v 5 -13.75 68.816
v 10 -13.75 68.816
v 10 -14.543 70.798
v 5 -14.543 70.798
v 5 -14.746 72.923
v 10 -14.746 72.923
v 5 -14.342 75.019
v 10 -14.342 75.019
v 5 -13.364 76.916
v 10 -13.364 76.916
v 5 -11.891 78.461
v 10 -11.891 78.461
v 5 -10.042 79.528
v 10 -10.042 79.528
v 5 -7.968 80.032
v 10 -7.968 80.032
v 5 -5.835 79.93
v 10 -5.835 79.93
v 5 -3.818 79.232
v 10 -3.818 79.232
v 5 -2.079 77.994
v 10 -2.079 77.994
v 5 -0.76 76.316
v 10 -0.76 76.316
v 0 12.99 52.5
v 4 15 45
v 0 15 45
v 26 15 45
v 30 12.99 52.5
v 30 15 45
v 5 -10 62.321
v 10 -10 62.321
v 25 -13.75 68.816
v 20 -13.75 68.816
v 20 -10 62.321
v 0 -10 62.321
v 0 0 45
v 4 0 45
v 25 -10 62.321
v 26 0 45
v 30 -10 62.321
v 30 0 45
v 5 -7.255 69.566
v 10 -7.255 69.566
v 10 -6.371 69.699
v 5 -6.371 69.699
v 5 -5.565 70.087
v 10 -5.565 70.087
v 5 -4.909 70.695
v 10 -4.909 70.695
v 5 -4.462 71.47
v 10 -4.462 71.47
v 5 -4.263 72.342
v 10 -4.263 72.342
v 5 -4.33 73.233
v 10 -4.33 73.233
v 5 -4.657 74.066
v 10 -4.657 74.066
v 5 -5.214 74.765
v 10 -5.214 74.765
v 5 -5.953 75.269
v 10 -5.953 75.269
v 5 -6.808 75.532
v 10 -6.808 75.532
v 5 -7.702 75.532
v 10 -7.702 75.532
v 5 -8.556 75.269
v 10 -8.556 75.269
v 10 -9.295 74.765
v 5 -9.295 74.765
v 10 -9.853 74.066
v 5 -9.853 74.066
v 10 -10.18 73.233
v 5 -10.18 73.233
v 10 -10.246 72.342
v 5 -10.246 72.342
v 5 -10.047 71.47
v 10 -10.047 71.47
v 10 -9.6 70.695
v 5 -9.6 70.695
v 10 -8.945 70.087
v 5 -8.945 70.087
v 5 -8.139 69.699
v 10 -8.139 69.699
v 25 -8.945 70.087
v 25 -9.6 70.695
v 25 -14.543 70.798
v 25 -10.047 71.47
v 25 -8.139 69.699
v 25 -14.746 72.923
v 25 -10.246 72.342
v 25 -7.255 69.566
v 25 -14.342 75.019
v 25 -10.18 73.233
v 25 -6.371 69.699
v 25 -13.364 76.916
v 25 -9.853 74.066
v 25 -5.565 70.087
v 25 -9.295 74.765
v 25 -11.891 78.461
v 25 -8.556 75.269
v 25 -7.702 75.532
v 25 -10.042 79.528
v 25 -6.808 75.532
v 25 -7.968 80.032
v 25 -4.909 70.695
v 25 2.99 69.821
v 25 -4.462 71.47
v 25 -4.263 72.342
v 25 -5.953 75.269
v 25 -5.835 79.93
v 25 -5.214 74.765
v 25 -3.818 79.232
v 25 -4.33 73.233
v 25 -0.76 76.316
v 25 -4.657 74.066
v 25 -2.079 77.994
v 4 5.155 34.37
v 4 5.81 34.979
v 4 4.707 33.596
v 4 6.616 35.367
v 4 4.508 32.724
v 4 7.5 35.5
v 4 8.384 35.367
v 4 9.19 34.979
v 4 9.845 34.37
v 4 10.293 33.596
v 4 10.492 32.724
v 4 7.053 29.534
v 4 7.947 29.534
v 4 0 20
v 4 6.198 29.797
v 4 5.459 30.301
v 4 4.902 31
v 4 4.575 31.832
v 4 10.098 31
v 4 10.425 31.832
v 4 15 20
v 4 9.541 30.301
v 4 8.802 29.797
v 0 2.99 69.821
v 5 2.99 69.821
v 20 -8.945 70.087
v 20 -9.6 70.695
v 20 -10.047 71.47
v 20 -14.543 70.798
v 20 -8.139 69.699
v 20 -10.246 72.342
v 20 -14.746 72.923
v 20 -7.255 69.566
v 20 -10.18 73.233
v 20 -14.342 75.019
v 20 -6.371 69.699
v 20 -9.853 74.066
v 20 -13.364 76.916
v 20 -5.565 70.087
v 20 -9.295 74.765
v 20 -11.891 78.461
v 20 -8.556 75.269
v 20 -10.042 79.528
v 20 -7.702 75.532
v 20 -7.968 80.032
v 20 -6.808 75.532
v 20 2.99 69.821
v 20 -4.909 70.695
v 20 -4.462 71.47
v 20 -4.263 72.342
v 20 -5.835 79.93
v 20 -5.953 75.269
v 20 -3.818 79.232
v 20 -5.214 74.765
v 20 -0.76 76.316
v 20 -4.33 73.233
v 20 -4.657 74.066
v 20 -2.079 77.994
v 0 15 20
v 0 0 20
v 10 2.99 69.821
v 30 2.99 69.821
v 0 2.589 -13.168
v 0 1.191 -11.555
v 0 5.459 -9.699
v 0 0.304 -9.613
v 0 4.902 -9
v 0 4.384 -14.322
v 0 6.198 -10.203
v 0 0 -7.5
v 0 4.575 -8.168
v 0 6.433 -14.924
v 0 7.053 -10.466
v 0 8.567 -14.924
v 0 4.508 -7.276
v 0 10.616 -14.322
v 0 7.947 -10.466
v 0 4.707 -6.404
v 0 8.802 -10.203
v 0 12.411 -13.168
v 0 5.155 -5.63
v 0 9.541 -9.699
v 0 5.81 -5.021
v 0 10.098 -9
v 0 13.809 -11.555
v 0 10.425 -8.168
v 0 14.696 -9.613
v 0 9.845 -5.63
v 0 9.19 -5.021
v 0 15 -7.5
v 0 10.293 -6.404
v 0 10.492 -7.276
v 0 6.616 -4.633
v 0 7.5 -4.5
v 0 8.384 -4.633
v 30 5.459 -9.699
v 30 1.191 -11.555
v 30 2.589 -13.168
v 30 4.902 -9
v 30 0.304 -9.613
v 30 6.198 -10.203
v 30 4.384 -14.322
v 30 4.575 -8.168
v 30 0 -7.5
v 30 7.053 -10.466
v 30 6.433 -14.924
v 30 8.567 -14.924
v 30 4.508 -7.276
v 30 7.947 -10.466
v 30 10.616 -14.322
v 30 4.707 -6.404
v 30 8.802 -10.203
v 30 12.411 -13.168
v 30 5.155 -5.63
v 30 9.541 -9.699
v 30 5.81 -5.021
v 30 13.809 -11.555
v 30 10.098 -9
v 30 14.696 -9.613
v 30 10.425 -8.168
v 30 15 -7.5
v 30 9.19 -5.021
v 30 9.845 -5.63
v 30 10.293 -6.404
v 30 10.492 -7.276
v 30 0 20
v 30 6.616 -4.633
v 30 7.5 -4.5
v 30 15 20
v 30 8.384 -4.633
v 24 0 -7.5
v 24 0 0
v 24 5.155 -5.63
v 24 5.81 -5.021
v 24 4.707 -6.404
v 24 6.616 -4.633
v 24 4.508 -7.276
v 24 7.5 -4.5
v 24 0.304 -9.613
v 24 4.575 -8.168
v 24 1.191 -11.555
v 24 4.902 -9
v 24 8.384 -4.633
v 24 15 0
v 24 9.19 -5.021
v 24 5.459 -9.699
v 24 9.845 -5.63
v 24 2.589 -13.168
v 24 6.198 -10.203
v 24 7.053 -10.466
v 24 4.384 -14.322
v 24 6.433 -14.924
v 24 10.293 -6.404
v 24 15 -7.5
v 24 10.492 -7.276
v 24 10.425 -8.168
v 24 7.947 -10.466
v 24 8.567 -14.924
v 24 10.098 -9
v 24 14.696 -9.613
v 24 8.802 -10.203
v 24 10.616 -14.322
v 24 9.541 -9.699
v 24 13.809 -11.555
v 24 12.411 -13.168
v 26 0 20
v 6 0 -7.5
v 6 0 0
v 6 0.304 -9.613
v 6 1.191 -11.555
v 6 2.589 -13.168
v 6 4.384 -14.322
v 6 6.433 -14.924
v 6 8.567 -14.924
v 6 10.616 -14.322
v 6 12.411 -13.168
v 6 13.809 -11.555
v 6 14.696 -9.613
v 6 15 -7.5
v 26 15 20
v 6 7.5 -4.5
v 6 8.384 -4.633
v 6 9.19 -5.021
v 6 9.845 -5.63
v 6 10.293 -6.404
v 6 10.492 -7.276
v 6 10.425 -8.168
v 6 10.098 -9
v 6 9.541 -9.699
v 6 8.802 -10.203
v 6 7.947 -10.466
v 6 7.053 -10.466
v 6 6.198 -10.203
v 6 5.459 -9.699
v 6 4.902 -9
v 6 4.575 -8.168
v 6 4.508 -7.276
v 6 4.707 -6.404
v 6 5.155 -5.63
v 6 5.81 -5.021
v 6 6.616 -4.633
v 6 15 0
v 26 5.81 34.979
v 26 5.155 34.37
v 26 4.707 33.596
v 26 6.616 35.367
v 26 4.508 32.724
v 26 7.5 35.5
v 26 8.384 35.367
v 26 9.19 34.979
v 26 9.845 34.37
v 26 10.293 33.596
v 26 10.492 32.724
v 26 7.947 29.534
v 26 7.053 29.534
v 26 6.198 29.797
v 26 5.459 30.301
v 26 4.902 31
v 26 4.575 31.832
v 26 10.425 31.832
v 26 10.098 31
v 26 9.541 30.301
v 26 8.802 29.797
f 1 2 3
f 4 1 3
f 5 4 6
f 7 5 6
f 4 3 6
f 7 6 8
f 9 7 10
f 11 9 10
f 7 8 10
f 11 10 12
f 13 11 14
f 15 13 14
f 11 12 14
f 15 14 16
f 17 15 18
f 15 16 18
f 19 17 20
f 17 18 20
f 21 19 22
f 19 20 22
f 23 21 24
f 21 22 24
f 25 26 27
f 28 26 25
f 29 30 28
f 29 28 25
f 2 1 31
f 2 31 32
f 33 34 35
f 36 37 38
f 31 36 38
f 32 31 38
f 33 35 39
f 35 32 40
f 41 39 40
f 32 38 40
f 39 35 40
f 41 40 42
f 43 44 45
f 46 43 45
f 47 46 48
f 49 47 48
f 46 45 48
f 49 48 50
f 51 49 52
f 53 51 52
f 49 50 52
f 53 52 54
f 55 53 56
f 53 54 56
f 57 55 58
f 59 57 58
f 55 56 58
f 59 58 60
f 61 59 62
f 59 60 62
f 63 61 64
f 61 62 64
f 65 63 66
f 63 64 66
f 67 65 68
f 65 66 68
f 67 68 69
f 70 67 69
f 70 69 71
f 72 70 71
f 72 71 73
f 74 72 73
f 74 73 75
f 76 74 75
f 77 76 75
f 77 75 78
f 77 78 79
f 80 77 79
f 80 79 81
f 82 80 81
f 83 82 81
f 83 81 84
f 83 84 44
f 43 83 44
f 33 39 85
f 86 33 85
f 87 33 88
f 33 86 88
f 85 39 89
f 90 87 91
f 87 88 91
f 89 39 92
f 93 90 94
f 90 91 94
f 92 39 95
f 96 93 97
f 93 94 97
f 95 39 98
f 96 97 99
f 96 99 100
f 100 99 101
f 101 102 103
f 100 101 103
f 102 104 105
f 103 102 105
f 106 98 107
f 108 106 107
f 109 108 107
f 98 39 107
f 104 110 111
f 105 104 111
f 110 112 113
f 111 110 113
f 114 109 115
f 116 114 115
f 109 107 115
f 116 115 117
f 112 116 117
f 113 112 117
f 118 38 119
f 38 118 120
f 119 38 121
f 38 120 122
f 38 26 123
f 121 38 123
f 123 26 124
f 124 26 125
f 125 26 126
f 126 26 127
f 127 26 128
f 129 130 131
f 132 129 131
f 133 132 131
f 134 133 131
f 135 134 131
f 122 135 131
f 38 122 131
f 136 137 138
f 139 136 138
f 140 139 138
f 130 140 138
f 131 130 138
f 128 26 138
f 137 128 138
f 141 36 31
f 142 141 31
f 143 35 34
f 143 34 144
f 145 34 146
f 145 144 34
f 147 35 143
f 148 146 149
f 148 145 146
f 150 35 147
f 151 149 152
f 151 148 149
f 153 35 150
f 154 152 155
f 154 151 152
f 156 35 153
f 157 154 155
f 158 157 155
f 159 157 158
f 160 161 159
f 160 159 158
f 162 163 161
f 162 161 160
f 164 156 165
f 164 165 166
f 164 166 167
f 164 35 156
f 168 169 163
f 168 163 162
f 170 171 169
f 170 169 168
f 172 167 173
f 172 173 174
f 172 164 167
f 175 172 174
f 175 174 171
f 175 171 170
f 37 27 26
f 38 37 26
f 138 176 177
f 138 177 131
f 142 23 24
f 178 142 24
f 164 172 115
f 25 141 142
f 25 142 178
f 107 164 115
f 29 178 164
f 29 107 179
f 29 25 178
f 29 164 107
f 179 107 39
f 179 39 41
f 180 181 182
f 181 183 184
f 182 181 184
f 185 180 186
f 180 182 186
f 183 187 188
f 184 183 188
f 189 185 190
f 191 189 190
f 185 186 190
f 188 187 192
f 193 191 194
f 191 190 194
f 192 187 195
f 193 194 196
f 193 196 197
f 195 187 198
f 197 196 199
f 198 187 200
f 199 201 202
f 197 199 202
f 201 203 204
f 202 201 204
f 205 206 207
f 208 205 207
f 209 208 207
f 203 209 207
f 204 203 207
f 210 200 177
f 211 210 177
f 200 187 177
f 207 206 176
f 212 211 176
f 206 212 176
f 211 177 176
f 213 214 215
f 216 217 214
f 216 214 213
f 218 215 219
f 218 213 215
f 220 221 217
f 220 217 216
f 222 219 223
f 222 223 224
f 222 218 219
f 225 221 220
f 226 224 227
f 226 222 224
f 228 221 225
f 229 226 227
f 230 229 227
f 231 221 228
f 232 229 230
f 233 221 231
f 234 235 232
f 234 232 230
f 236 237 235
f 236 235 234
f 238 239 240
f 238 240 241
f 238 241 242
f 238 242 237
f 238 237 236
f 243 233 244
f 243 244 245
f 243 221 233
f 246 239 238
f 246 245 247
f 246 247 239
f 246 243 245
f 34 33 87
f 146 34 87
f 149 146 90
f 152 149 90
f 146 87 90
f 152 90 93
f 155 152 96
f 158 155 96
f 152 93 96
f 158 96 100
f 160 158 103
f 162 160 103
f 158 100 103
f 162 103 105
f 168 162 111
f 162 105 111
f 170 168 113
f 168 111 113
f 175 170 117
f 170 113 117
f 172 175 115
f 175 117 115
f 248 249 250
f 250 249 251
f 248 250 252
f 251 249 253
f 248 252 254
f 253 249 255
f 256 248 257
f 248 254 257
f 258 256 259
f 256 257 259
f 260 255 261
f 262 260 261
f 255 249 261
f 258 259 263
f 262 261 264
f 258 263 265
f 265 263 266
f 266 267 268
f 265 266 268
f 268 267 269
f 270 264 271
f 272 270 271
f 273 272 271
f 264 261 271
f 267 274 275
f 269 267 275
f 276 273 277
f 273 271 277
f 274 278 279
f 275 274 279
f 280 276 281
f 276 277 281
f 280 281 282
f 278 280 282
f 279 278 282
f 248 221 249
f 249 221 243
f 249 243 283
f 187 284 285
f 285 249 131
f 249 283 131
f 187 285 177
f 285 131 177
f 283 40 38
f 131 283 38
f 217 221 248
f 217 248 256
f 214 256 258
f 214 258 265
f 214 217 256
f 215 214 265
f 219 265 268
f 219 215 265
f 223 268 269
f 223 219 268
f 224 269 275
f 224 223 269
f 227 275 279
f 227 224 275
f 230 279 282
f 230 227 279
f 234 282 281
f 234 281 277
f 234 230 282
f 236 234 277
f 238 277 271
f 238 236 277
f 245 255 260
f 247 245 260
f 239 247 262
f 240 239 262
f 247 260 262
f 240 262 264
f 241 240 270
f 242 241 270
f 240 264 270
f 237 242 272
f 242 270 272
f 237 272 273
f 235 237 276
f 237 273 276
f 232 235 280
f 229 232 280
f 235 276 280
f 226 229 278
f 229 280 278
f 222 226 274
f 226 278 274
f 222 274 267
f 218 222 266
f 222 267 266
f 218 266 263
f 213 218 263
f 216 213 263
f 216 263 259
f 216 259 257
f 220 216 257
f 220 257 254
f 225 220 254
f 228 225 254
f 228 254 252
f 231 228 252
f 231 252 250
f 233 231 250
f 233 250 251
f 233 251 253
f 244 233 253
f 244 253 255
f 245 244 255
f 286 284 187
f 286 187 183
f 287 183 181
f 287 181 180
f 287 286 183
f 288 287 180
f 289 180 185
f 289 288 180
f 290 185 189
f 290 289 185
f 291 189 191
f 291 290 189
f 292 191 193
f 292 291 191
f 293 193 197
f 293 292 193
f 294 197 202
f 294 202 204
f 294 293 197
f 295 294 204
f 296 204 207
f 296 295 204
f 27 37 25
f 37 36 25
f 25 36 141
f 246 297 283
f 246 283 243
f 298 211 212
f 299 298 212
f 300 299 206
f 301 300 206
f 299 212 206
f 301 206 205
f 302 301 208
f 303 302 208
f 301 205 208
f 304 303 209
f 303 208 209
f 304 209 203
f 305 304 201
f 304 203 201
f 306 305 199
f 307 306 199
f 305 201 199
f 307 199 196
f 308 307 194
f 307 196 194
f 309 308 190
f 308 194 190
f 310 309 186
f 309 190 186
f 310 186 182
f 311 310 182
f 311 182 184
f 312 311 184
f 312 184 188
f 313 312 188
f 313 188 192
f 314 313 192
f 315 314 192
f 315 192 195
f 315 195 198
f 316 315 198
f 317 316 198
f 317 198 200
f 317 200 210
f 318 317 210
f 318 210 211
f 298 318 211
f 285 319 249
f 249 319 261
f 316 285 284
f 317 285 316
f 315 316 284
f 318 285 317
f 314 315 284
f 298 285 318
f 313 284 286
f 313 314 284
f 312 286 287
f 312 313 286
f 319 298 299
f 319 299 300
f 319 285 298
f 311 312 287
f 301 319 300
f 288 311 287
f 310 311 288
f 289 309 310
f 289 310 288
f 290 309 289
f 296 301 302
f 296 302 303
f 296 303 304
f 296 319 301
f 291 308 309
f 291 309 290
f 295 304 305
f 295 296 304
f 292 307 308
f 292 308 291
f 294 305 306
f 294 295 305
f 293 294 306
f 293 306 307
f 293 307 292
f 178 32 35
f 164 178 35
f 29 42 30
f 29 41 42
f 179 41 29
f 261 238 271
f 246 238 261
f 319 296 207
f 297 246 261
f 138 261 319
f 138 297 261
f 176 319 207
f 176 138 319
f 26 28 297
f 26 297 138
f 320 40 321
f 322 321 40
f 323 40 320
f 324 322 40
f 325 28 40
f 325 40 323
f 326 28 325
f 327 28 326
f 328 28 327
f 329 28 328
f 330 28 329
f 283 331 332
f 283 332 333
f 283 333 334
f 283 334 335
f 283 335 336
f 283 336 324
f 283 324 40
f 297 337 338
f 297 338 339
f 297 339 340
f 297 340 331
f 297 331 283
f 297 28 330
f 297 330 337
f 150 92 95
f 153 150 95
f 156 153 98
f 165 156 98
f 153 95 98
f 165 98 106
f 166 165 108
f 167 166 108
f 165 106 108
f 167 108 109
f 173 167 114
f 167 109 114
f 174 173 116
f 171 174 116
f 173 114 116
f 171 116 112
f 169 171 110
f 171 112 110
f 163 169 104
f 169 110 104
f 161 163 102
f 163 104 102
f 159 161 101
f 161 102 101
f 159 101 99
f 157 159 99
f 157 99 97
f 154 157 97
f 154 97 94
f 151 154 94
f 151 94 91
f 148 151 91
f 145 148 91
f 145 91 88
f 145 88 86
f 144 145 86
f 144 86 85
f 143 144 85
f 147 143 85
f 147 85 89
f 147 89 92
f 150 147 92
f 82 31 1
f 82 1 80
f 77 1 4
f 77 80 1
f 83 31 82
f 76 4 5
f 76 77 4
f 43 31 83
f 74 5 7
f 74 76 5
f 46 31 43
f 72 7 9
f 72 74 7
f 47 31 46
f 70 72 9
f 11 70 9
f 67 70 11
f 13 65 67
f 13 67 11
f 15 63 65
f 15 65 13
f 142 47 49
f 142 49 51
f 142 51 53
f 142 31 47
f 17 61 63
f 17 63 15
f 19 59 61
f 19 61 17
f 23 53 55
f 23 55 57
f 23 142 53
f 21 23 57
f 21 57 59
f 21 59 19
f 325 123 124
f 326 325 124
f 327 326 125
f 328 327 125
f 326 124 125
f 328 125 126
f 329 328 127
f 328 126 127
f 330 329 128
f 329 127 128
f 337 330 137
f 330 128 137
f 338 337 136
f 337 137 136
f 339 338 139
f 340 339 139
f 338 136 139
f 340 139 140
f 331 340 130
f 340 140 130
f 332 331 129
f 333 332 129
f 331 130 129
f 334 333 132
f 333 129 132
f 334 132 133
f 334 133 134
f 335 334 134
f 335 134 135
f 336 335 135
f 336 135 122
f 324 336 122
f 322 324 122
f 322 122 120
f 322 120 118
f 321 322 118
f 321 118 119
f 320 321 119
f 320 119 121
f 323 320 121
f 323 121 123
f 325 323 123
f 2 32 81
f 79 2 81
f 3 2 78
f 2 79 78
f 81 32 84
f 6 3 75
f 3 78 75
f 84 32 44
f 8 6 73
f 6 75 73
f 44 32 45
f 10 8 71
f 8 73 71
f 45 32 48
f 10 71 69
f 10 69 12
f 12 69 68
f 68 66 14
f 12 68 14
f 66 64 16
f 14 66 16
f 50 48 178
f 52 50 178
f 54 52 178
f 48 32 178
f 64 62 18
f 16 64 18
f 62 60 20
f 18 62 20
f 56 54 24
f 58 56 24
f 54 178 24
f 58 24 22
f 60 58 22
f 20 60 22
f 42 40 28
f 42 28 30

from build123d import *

# Parameters (mm, degrees)
SKETCH1_W            = 30
SKETCH1_H            = 15
BOSS_EXTRUDE1_DEPTH  = 45
SKETCH2_W            = 6
SKETCH2_H            = 15
BOSS_EXTRUDE2_DEPTH  = 7.5
BOSS_EXTRUDE3_DEPTH  = 6
BOSS_EXTRUDE4_START  = -24
BOSS_EXTRUDE4_DEPTH  = 6
SKETCH4_R            = 3
CUT_EXTRUDE1_DEPTH   = 30
SKETCH18_W           = 30
SKETCH18_H           = 15
BOSS_EXTRUDE10_DEPTH = 20
BOSS_EXTRUDE11_DEPTH = 30
SKETCH19_W           = 5
SKETCH19_H           = 15
BOSS_EXTRUDE12_DEPTH = 7.5
CUT_EXTRUDE7_REACH   = 88.894
SKETCH22_W           = 4
SKETCH22_H           = 25
SKETCH23_R           = 3
CUT_EXTRUDE8_DEPTH   = 83.00662079
BOSS_EXTRUDE15_DEPTH = 5
BOSS_EXTRUDE16_START = -15
BOSS_EXTRUDE16_DEPTH = 5
SKETCH25_R           = 3
CUT_EXTRUDE10_DEPTH  = 20


with BuildPart() as part:
    # Sketch1 → Boss-Extrude1 (new body)
    with BuildSketch(Plane.XY):
        with Locations((15, 7.5)):
            Rectangle(SKETCH1_W, SKETCH1_H)
    extrude(amount=BOSS_EXTRUDE1_DEPTH)

    # Sketch2 → Boss-Extrude2 (add)
    with BuildSketch(Plane(origin=(0, 0, 0), x_dir=(-1, 0, 0), z_dir=(0, 0, -1))):
        with Locations((-27, 7.5)):
            Rectangle(SKETCH2_W, SKETCH2_H)
        with Locations((-3, 7.5)):
            Rectangle(SKETCH2_W, SKETCH2_H)
    extrude(amount=BOSS_EXTRUDE2_DEPTH)

    # Sketch3 → Boss-Extrude3 (add)
    with BuildSketch(Plane(origin=(30, 0, 0), x_dir=(0, 0, -1), z_dir=(1, 0, 0))):
        with BuildLine():
            Line((7.5, 15), (7.5, 0))
            ThreePointArc((7.5, 0), (15, 7.5), (7.5, 15))
        make_face()
    extrude(amount=-BOSS_EXTRUDE3_DEPTH)

    # Sketch3<2> → Boss-Extrude4 (add)
    with BuildSketch(Plane(origin=(30, 0, 0), x_dir=(0, 0, -1), z_dir=(1, 0, 0)).offset(BOSS_EXTRUDE4_START)):
        with BuildLine():
            Line((7.5, 15), (7.5, 0))
            ThreePointArc((7.5, 0), (15, 7.5), (7.5, 15))
        make_face()
    extrude(amount=-BOSS_EXTRUDE4_DEPTH)

    # Sketch4 → Cut-Extrude1 (cut)
    with BuildSketch(Plane.ZY):
        with Locations((-7.5, 7.5)):
            Circle(SKETCH4_R)
    extrude(amount=-CUT_EXTRUDE1_DEPTH, mode=Mode.SUBTRACT)



with BuildPart() as body_2:
    # Sketch18 → Boss-Extrude10 (new body)
    with BuildSketch(Plane(origin=(0, -19.485571585, 33.75), x_dir=(1, 0, 0), z_dir=(0, -0.500000000000001, 0.866025403784438))):
        with Locations((15, 30)):
            Rectangle(SKETCH18_W, SKETCH18_H)
    extrude(amount=BOSS_EXTRUDE10_DEPTH)


with BuildPart() as part_1:
    add(part.part)

    add(body_2.part)  # Boss-Extrude11 merges body 2
    # 3DSketch1 → Boss-Extrude11 (add)
    with BuildSketch(Plane(origin=(30, 0, 45), x_dir=(0, 1, 0), z_dir=(1, 0, 0))):
        Polygon((0, 0), (15, 0), (12.990381057, 7.5), align=None)
    extrude(amount=-BOSS_EXTRUDE11_DEPTH)

    # Sketch19 → Boss-Extrude12 (add)
    with BuildSketch(Plane(origin=(0, -29.485571585, 51.070508076), x_dir=(1, 0, 0), z_dir=(0, -0.5000000000000009, 0.8660254037844383))):
        with Locations((7.5, 30)):
            Rectangle(SKETCH19_W, SKETCH19_H)
        with Locations((22.5, 30)):
            Rectangle(SKETCH19_W, SKETCH19_H)
    extrude(amount=BOSS_EXTRUDE12_DEPTH)

    # Sketch22 → Cut-Extrude7 (cut, up to next)
    with BuildSketch(Plane(origin=(0, 15, 0), x_dir=(1, 0, 0), z_dir=(0, 1, 0)), mode=Mode.PRIVATE) as cut_extrude7_sk1:
        with Locations((2, -32.5)):
            Rectangle(SKETCH22_W, SKETCH22_H)
    cut_extrude7_tool1 = extrude(cut_extrude7_sk1.sketch, amount=-CUT_EXTRUDE7_REACH, mode=Mode.PRIVATE) & part_1.part
    # Sketch22 → Cut-Extrude7 (cut, up to next)
    with BuildSketch(Plane(origin=(0, 15, 0), x_dir=(1, 0, 0), z_dir=(0, 1, 0)), mode=Mode.PRIVATE) as cut_extrude7_sk2:
        with Locations((28, -32.5)):
            Rectangle(SKETCH22_W, SKETCH22_H)
    cut_extrude7_tool2 = extrude(cut_extrude7_sk2.sketch, amount=-CUT_EXTRUDE7_REACH, mode=Mode.PRIVATE) & part_1.part
    add(cut_extrude7_tool1.solids().sort_by_distance((2, 15, 32.5))[0], mode=Mode.SUBTRACT)
    add(cut_extrude7_tool2.solids().sort_by_distance((28, 15, 32.5))[0], mode=Mode.SUBTRACT)

    # Sketch23 → Cut-Extrude8 (cut, through all)
    with BuildSketch(Plane.ZY.offset(-4)):
        with Locations((32.5, 7.5)):
            Circle(SKETCH23_R)
    extrude(amount=-CUT_EXTRUDE8_DEPTH, mode=Mode.SUBTRACT)

    # Sketch24 → Boss-Extrude15 (add)
    with BuildSketch(Plane(origin=(25, 0, 0), x_dir=(0, 0, -1), z_dir=(1, 0, 0))):
        with BuildLine():
            Line((-76.315698604, -0.759618943), (-68.815698604, -13.75))
            ThreePointArc((-68.815698604, -13.75), (-79.060889132, -11.004809472), (-76.315698604, -0.759618943))
        make_face()
    extrude(amount=-BOSS_EXTRUDE15_DEPTH)

    # Sketch24<2> → Boss-Extrude16 (add)
    with BuildSketch(Plane(origin=(25, 0, 0), x_dir=(0, 0, -1), z_dir=(1, 0, 0)).offset(BOSS_EXTRUDE16_START)):
        with BuildLine():
            Line((-76.315698604, -0.759618943), (-68.815698604, -13.75))
            ThreePointArc((-68.815698604, -13.75), (-79.060889132, -11.004809472), (-76.315698604, -0.759618943))
        make_face()
    extrude(amount=-BOSS_EXTRUDE16_DEPTH)

    # Sketch25 → Cut-Extrude10 (cut)
    with BuildSketch(Plane(origin=(25, 0, 0), x_dir=(0, 0, -1), z_dir=(1, 0, 0))):
        with Locations((-72.565698604, -7.254809472)):
            Circle(SKETCH25_R)
    extrude(amount=-CUT_EXTRUDE10_DEPTH, mode=Mode.SUBTRACT)


solid = part_1.part
